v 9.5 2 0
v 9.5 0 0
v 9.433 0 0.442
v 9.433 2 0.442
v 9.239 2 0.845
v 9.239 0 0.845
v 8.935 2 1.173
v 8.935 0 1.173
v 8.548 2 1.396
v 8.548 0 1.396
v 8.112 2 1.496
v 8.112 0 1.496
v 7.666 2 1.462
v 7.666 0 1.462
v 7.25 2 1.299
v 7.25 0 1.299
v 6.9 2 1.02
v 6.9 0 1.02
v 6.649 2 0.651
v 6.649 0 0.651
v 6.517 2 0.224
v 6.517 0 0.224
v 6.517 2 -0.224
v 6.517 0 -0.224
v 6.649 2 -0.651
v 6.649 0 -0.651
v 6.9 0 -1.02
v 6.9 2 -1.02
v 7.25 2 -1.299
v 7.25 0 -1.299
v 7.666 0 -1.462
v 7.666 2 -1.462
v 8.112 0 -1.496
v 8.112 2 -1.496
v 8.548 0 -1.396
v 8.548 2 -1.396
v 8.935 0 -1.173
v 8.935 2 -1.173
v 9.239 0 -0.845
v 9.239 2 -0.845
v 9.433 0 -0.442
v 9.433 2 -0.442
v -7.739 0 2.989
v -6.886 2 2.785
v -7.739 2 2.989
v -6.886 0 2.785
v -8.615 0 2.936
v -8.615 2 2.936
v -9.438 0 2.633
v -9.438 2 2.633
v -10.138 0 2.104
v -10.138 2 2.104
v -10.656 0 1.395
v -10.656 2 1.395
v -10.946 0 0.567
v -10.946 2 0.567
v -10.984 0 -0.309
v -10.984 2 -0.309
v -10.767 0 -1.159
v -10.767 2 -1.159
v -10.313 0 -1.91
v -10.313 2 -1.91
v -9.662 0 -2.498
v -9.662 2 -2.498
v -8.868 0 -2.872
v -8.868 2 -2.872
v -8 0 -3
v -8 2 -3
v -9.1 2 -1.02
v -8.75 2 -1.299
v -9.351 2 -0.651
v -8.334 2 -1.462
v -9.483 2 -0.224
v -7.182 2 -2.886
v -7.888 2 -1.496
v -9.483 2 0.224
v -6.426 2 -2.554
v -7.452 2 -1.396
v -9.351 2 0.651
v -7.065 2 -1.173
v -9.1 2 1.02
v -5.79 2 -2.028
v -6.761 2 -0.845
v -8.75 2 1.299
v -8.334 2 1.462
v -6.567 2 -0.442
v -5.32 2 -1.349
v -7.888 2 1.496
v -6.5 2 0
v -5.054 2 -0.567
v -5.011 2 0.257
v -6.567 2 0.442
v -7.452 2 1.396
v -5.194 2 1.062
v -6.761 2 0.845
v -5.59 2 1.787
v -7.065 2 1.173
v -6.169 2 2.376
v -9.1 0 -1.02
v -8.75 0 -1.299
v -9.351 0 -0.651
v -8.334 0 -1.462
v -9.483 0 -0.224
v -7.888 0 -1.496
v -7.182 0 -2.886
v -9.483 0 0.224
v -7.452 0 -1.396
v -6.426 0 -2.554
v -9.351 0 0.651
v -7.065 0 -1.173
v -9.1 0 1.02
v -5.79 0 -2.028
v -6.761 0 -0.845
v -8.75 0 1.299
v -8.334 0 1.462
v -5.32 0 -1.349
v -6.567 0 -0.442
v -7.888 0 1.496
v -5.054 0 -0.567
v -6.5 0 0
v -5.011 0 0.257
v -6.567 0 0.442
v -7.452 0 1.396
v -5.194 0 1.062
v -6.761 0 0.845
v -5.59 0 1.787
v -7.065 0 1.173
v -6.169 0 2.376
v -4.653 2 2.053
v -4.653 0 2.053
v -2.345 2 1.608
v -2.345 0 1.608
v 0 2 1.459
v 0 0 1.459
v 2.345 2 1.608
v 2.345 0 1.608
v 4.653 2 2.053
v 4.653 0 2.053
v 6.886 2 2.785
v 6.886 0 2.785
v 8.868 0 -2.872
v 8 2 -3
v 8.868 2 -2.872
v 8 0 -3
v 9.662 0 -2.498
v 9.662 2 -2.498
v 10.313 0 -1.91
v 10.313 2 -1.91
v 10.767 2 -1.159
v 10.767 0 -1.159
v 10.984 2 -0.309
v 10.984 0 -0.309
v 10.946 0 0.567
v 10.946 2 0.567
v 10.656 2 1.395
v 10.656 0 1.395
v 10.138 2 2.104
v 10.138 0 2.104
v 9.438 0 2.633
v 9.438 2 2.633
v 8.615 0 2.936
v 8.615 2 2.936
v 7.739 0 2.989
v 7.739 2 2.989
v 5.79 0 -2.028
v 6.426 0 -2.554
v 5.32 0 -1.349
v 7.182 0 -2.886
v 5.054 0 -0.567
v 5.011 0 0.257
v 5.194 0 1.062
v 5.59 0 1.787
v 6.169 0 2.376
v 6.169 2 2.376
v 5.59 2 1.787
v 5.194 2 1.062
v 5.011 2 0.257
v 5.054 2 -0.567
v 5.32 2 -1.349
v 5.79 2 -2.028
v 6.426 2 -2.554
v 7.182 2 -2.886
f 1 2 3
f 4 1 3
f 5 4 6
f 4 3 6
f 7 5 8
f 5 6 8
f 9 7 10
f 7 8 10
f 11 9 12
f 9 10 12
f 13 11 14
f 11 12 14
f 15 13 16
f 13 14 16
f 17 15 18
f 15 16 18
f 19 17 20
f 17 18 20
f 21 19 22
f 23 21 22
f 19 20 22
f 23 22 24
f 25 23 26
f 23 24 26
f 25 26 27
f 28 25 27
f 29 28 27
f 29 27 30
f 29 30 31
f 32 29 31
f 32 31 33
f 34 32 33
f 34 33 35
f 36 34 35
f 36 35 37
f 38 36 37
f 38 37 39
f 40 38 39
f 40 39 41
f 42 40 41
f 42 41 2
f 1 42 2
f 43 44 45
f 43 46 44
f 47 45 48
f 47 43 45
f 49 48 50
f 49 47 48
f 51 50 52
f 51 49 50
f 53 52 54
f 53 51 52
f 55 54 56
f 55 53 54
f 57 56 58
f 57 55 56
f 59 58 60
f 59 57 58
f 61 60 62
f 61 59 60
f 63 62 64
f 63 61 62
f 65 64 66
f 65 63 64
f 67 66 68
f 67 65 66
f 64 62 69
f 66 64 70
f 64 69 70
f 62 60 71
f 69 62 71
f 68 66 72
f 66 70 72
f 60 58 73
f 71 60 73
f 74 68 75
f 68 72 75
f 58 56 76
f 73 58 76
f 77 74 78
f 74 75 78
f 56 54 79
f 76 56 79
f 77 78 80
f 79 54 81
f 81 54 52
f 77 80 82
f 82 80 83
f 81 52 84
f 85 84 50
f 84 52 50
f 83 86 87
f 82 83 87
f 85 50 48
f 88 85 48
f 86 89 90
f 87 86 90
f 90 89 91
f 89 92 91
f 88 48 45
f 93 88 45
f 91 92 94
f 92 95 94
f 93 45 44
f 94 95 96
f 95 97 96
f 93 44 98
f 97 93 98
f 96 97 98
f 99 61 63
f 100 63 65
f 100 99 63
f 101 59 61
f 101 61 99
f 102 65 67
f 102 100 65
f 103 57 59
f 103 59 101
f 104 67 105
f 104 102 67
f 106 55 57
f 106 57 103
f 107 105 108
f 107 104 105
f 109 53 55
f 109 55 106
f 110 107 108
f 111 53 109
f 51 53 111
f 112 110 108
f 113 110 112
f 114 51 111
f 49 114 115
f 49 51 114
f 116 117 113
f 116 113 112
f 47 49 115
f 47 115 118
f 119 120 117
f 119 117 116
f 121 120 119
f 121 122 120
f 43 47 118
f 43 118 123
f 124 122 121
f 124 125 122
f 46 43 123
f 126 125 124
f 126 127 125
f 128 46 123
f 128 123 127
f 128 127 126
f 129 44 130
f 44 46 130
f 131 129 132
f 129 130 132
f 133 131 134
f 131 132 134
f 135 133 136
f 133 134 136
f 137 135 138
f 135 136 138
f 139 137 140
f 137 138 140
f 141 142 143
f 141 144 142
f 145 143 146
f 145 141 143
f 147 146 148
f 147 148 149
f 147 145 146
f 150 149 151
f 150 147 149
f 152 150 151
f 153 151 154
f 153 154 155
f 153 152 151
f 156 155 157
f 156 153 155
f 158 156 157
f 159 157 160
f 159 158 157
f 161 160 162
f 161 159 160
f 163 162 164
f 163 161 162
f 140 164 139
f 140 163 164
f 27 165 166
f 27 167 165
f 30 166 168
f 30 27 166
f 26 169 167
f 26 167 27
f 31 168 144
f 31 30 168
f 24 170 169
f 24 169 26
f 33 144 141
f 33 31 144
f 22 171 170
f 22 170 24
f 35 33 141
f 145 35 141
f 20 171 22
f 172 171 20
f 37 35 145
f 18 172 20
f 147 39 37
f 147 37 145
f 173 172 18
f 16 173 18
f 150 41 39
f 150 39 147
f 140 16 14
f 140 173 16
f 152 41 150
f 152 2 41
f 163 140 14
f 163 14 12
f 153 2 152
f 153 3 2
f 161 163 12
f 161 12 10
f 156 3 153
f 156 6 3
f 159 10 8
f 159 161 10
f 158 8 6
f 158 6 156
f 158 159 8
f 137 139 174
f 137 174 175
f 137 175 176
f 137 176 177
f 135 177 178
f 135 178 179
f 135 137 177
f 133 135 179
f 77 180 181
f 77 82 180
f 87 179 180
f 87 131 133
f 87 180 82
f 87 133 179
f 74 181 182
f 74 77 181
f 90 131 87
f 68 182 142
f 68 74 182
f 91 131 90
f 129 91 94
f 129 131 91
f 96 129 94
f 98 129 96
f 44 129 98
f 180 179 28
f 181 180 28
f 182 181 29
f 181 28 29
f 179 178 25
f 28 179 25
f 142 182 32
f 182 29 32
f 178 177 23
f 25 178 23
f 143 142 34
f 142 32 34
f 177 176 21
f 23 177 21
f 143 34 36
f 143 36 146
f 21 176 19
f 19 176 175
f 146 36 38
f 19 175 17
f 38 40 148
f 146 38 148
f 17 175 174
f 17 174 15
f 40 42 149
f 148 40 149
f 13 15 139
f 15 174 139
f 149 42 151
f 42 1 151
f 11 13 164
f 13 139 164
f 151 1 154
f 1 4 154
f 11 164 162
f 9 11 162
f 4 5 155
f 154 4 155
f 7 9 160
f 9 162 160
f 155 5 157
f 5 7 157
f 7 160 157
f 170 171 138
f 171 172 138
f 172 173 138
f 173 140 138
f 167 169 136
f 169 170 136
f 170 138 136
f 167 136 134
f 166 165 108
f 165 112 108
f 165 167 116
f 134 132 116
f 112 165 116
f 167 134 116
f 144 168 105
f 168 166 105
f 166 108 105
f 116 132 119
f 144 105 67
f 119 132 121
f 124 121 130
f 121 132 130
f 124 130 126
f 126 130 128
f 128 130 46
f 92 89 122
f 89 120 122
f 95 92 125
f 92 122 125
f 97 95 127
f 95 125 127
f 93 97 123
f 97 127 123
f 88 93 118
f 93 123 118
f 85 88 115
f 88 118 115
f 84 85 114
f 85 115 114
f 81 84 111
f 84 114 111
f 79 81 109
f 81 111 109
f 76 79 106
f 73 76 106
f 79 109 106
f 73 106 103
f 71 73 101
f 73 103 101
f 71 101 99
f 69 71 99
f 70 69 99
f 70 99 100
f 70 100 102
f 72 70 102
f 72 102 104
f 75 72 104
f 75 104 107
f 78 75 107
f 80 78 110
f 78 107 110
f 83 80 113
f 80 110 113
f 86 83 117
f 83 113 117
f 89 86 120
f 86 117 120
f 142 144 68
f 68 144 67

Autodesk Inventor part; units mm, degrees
ref_plane "YZ Plane" through (0, 0, 0) normal (1, 0, 0) x (0, 1, 0)
ref_plane "XZ Plane" through (0, 0, 0) normal (0, 1, 0) x (-1, 0, 0)
ref_plane "XY Plane" through (0, 0, 0) normal (0, 0, 1) x (1, 0, 0)
sketch "Sketch1" plane through (0, 0, 0) normal (0, 1, 0) x (-1, 0, 0)
  line L0 (-8, -3) -> (8, -3)
  line L1 (8, -3) -> (8, 3)
  line L2 (8, 3) -> (-8, 3)
  line L3 (-8, 3) -> (-8, -3)
  line L4 (-8, -3) -> (8, 3) construction
  line L5 (8, -3) -> (-8, 3) construction
  circle A0 centre (8, 0) radius 3
  circle A1 centre (-8, 0) radius 3
  point P0 (0, 0)
  dimension "d0" = 16
  dimension "d1" = 6
  dimension "d2" = 6
  dimension "d3" = 6
extrude "Extrusion1" add sketch "Sketch1" along normal blind 2
sketch "Sketch2" plane through (0, 2, 0) normal (0, 1, 0) x (1, 0, 0)
  arc A0 (8, -3) -> (8, 3) centre (8, 0) ccw projected
  arc A1 (-8, 3) -> (-8, -3) centre (-8, 0) ccw projected
  circle A2 centre (-8, 0) radius 1.5
  circle A3 centre (8, 0) radius 1.5
  point P0 (0, 0)
  dimension "d6" = 3
  dimension "d7" = 3
extrude "Extrusion2" cut sketch "Sketch2" against normal blind 2
sketch "Sketch3" plane through (0, 0, 0) normal (0, -1, 0) x (1, 0, 0)
  line L0 (-8, 3) -> (8, 3) projected
  line L1 (0, 0) -> (0, 20)
  circle A0 centre (0, 20) radius 18.5407
  dimension "d11" = 20
extrude "Extrusion3" cut sketch "Sketch3" against normal blind 2
sketch "Sketch4" plane through (0, 0, 0) normal (0, -1, 0) x (1, 0, 0)
  arc A0 (-7.3997, 3) -> (7.3997, 3) centre (0, 20) ccw projected
  circle A1 centre (-8, 0) radius 1.5 projected
  circle A2 centre (8, 0) radius 1.5 projected
  circle A3 centre (-8, 0) radius 3
  circle A4 centre (8, 0) radius 3
  point P0 (0, 0)
extrude "Extrusion4" cut sketch "Sketch4" against normal blind 2
sketch "Sketch5" plane through (0, 0, 0) normal (0, -1, 0) x (1, 0, 0)
  arc A0 (8, 3) -> (6.8858, 2.7854) centre (8, 0) ccw projected
  line L0 (7.3997, 3) -> (8, 3) projected
  arc A1 (6.8858, 2.7854) -> (7.3997, 3) centre (0, 20) ccw projected
  point P0 (0, 0)
extrude "Extrusion5" cut sketch "Sketch5" against normal blind 2
sketch "Sketch6" plane through (0, 0, 0) normal (0, -1, 0) x (1, 0, 0)
  arc A0 (-6.8858, 2.7854) -> (-8, 3) centre (-8, 0) ccw projected
  arc A1 (-7.3997, 3) -> (-6.8858, 2.7854) centre (0, 20) ccw projected
  line L0 (-8, 3) -> (-7.3997, 3) projected
  point P0 (0, 0)
extrude "Extrusion6" cut sketch "Sketch6" against normal blind 2
sketch "Sketch7" plane through (0, 0, 0) normal (0, -1, 0) x (1, 0, 0)
  arc A0 (-8, -3) -> (-6.8858, 2.7854) centre (-8, 0) ccw projected
  arc A1 (6.8858, 2.7854) -> (8, -3) centre (8, 0) ccw projected
  circle A2 centre (-8, 0) radius 3
  circle A3 centre (8, 0) radius 3
  circle A4 centre (-8, 0) radius 3
  circle A5 centre (-8, 0) radius 1.5
  circle A6 centre (8, 0) radius 1.5
  point P0 (0, 0)
  dimension "d20" = 6
  dimension "d21" = 3
  dimension "d22" = 3
extrude "Extrusion7" add sketch "Sketch7" against normal blind 2
properties part number "tahlo5(b)"
